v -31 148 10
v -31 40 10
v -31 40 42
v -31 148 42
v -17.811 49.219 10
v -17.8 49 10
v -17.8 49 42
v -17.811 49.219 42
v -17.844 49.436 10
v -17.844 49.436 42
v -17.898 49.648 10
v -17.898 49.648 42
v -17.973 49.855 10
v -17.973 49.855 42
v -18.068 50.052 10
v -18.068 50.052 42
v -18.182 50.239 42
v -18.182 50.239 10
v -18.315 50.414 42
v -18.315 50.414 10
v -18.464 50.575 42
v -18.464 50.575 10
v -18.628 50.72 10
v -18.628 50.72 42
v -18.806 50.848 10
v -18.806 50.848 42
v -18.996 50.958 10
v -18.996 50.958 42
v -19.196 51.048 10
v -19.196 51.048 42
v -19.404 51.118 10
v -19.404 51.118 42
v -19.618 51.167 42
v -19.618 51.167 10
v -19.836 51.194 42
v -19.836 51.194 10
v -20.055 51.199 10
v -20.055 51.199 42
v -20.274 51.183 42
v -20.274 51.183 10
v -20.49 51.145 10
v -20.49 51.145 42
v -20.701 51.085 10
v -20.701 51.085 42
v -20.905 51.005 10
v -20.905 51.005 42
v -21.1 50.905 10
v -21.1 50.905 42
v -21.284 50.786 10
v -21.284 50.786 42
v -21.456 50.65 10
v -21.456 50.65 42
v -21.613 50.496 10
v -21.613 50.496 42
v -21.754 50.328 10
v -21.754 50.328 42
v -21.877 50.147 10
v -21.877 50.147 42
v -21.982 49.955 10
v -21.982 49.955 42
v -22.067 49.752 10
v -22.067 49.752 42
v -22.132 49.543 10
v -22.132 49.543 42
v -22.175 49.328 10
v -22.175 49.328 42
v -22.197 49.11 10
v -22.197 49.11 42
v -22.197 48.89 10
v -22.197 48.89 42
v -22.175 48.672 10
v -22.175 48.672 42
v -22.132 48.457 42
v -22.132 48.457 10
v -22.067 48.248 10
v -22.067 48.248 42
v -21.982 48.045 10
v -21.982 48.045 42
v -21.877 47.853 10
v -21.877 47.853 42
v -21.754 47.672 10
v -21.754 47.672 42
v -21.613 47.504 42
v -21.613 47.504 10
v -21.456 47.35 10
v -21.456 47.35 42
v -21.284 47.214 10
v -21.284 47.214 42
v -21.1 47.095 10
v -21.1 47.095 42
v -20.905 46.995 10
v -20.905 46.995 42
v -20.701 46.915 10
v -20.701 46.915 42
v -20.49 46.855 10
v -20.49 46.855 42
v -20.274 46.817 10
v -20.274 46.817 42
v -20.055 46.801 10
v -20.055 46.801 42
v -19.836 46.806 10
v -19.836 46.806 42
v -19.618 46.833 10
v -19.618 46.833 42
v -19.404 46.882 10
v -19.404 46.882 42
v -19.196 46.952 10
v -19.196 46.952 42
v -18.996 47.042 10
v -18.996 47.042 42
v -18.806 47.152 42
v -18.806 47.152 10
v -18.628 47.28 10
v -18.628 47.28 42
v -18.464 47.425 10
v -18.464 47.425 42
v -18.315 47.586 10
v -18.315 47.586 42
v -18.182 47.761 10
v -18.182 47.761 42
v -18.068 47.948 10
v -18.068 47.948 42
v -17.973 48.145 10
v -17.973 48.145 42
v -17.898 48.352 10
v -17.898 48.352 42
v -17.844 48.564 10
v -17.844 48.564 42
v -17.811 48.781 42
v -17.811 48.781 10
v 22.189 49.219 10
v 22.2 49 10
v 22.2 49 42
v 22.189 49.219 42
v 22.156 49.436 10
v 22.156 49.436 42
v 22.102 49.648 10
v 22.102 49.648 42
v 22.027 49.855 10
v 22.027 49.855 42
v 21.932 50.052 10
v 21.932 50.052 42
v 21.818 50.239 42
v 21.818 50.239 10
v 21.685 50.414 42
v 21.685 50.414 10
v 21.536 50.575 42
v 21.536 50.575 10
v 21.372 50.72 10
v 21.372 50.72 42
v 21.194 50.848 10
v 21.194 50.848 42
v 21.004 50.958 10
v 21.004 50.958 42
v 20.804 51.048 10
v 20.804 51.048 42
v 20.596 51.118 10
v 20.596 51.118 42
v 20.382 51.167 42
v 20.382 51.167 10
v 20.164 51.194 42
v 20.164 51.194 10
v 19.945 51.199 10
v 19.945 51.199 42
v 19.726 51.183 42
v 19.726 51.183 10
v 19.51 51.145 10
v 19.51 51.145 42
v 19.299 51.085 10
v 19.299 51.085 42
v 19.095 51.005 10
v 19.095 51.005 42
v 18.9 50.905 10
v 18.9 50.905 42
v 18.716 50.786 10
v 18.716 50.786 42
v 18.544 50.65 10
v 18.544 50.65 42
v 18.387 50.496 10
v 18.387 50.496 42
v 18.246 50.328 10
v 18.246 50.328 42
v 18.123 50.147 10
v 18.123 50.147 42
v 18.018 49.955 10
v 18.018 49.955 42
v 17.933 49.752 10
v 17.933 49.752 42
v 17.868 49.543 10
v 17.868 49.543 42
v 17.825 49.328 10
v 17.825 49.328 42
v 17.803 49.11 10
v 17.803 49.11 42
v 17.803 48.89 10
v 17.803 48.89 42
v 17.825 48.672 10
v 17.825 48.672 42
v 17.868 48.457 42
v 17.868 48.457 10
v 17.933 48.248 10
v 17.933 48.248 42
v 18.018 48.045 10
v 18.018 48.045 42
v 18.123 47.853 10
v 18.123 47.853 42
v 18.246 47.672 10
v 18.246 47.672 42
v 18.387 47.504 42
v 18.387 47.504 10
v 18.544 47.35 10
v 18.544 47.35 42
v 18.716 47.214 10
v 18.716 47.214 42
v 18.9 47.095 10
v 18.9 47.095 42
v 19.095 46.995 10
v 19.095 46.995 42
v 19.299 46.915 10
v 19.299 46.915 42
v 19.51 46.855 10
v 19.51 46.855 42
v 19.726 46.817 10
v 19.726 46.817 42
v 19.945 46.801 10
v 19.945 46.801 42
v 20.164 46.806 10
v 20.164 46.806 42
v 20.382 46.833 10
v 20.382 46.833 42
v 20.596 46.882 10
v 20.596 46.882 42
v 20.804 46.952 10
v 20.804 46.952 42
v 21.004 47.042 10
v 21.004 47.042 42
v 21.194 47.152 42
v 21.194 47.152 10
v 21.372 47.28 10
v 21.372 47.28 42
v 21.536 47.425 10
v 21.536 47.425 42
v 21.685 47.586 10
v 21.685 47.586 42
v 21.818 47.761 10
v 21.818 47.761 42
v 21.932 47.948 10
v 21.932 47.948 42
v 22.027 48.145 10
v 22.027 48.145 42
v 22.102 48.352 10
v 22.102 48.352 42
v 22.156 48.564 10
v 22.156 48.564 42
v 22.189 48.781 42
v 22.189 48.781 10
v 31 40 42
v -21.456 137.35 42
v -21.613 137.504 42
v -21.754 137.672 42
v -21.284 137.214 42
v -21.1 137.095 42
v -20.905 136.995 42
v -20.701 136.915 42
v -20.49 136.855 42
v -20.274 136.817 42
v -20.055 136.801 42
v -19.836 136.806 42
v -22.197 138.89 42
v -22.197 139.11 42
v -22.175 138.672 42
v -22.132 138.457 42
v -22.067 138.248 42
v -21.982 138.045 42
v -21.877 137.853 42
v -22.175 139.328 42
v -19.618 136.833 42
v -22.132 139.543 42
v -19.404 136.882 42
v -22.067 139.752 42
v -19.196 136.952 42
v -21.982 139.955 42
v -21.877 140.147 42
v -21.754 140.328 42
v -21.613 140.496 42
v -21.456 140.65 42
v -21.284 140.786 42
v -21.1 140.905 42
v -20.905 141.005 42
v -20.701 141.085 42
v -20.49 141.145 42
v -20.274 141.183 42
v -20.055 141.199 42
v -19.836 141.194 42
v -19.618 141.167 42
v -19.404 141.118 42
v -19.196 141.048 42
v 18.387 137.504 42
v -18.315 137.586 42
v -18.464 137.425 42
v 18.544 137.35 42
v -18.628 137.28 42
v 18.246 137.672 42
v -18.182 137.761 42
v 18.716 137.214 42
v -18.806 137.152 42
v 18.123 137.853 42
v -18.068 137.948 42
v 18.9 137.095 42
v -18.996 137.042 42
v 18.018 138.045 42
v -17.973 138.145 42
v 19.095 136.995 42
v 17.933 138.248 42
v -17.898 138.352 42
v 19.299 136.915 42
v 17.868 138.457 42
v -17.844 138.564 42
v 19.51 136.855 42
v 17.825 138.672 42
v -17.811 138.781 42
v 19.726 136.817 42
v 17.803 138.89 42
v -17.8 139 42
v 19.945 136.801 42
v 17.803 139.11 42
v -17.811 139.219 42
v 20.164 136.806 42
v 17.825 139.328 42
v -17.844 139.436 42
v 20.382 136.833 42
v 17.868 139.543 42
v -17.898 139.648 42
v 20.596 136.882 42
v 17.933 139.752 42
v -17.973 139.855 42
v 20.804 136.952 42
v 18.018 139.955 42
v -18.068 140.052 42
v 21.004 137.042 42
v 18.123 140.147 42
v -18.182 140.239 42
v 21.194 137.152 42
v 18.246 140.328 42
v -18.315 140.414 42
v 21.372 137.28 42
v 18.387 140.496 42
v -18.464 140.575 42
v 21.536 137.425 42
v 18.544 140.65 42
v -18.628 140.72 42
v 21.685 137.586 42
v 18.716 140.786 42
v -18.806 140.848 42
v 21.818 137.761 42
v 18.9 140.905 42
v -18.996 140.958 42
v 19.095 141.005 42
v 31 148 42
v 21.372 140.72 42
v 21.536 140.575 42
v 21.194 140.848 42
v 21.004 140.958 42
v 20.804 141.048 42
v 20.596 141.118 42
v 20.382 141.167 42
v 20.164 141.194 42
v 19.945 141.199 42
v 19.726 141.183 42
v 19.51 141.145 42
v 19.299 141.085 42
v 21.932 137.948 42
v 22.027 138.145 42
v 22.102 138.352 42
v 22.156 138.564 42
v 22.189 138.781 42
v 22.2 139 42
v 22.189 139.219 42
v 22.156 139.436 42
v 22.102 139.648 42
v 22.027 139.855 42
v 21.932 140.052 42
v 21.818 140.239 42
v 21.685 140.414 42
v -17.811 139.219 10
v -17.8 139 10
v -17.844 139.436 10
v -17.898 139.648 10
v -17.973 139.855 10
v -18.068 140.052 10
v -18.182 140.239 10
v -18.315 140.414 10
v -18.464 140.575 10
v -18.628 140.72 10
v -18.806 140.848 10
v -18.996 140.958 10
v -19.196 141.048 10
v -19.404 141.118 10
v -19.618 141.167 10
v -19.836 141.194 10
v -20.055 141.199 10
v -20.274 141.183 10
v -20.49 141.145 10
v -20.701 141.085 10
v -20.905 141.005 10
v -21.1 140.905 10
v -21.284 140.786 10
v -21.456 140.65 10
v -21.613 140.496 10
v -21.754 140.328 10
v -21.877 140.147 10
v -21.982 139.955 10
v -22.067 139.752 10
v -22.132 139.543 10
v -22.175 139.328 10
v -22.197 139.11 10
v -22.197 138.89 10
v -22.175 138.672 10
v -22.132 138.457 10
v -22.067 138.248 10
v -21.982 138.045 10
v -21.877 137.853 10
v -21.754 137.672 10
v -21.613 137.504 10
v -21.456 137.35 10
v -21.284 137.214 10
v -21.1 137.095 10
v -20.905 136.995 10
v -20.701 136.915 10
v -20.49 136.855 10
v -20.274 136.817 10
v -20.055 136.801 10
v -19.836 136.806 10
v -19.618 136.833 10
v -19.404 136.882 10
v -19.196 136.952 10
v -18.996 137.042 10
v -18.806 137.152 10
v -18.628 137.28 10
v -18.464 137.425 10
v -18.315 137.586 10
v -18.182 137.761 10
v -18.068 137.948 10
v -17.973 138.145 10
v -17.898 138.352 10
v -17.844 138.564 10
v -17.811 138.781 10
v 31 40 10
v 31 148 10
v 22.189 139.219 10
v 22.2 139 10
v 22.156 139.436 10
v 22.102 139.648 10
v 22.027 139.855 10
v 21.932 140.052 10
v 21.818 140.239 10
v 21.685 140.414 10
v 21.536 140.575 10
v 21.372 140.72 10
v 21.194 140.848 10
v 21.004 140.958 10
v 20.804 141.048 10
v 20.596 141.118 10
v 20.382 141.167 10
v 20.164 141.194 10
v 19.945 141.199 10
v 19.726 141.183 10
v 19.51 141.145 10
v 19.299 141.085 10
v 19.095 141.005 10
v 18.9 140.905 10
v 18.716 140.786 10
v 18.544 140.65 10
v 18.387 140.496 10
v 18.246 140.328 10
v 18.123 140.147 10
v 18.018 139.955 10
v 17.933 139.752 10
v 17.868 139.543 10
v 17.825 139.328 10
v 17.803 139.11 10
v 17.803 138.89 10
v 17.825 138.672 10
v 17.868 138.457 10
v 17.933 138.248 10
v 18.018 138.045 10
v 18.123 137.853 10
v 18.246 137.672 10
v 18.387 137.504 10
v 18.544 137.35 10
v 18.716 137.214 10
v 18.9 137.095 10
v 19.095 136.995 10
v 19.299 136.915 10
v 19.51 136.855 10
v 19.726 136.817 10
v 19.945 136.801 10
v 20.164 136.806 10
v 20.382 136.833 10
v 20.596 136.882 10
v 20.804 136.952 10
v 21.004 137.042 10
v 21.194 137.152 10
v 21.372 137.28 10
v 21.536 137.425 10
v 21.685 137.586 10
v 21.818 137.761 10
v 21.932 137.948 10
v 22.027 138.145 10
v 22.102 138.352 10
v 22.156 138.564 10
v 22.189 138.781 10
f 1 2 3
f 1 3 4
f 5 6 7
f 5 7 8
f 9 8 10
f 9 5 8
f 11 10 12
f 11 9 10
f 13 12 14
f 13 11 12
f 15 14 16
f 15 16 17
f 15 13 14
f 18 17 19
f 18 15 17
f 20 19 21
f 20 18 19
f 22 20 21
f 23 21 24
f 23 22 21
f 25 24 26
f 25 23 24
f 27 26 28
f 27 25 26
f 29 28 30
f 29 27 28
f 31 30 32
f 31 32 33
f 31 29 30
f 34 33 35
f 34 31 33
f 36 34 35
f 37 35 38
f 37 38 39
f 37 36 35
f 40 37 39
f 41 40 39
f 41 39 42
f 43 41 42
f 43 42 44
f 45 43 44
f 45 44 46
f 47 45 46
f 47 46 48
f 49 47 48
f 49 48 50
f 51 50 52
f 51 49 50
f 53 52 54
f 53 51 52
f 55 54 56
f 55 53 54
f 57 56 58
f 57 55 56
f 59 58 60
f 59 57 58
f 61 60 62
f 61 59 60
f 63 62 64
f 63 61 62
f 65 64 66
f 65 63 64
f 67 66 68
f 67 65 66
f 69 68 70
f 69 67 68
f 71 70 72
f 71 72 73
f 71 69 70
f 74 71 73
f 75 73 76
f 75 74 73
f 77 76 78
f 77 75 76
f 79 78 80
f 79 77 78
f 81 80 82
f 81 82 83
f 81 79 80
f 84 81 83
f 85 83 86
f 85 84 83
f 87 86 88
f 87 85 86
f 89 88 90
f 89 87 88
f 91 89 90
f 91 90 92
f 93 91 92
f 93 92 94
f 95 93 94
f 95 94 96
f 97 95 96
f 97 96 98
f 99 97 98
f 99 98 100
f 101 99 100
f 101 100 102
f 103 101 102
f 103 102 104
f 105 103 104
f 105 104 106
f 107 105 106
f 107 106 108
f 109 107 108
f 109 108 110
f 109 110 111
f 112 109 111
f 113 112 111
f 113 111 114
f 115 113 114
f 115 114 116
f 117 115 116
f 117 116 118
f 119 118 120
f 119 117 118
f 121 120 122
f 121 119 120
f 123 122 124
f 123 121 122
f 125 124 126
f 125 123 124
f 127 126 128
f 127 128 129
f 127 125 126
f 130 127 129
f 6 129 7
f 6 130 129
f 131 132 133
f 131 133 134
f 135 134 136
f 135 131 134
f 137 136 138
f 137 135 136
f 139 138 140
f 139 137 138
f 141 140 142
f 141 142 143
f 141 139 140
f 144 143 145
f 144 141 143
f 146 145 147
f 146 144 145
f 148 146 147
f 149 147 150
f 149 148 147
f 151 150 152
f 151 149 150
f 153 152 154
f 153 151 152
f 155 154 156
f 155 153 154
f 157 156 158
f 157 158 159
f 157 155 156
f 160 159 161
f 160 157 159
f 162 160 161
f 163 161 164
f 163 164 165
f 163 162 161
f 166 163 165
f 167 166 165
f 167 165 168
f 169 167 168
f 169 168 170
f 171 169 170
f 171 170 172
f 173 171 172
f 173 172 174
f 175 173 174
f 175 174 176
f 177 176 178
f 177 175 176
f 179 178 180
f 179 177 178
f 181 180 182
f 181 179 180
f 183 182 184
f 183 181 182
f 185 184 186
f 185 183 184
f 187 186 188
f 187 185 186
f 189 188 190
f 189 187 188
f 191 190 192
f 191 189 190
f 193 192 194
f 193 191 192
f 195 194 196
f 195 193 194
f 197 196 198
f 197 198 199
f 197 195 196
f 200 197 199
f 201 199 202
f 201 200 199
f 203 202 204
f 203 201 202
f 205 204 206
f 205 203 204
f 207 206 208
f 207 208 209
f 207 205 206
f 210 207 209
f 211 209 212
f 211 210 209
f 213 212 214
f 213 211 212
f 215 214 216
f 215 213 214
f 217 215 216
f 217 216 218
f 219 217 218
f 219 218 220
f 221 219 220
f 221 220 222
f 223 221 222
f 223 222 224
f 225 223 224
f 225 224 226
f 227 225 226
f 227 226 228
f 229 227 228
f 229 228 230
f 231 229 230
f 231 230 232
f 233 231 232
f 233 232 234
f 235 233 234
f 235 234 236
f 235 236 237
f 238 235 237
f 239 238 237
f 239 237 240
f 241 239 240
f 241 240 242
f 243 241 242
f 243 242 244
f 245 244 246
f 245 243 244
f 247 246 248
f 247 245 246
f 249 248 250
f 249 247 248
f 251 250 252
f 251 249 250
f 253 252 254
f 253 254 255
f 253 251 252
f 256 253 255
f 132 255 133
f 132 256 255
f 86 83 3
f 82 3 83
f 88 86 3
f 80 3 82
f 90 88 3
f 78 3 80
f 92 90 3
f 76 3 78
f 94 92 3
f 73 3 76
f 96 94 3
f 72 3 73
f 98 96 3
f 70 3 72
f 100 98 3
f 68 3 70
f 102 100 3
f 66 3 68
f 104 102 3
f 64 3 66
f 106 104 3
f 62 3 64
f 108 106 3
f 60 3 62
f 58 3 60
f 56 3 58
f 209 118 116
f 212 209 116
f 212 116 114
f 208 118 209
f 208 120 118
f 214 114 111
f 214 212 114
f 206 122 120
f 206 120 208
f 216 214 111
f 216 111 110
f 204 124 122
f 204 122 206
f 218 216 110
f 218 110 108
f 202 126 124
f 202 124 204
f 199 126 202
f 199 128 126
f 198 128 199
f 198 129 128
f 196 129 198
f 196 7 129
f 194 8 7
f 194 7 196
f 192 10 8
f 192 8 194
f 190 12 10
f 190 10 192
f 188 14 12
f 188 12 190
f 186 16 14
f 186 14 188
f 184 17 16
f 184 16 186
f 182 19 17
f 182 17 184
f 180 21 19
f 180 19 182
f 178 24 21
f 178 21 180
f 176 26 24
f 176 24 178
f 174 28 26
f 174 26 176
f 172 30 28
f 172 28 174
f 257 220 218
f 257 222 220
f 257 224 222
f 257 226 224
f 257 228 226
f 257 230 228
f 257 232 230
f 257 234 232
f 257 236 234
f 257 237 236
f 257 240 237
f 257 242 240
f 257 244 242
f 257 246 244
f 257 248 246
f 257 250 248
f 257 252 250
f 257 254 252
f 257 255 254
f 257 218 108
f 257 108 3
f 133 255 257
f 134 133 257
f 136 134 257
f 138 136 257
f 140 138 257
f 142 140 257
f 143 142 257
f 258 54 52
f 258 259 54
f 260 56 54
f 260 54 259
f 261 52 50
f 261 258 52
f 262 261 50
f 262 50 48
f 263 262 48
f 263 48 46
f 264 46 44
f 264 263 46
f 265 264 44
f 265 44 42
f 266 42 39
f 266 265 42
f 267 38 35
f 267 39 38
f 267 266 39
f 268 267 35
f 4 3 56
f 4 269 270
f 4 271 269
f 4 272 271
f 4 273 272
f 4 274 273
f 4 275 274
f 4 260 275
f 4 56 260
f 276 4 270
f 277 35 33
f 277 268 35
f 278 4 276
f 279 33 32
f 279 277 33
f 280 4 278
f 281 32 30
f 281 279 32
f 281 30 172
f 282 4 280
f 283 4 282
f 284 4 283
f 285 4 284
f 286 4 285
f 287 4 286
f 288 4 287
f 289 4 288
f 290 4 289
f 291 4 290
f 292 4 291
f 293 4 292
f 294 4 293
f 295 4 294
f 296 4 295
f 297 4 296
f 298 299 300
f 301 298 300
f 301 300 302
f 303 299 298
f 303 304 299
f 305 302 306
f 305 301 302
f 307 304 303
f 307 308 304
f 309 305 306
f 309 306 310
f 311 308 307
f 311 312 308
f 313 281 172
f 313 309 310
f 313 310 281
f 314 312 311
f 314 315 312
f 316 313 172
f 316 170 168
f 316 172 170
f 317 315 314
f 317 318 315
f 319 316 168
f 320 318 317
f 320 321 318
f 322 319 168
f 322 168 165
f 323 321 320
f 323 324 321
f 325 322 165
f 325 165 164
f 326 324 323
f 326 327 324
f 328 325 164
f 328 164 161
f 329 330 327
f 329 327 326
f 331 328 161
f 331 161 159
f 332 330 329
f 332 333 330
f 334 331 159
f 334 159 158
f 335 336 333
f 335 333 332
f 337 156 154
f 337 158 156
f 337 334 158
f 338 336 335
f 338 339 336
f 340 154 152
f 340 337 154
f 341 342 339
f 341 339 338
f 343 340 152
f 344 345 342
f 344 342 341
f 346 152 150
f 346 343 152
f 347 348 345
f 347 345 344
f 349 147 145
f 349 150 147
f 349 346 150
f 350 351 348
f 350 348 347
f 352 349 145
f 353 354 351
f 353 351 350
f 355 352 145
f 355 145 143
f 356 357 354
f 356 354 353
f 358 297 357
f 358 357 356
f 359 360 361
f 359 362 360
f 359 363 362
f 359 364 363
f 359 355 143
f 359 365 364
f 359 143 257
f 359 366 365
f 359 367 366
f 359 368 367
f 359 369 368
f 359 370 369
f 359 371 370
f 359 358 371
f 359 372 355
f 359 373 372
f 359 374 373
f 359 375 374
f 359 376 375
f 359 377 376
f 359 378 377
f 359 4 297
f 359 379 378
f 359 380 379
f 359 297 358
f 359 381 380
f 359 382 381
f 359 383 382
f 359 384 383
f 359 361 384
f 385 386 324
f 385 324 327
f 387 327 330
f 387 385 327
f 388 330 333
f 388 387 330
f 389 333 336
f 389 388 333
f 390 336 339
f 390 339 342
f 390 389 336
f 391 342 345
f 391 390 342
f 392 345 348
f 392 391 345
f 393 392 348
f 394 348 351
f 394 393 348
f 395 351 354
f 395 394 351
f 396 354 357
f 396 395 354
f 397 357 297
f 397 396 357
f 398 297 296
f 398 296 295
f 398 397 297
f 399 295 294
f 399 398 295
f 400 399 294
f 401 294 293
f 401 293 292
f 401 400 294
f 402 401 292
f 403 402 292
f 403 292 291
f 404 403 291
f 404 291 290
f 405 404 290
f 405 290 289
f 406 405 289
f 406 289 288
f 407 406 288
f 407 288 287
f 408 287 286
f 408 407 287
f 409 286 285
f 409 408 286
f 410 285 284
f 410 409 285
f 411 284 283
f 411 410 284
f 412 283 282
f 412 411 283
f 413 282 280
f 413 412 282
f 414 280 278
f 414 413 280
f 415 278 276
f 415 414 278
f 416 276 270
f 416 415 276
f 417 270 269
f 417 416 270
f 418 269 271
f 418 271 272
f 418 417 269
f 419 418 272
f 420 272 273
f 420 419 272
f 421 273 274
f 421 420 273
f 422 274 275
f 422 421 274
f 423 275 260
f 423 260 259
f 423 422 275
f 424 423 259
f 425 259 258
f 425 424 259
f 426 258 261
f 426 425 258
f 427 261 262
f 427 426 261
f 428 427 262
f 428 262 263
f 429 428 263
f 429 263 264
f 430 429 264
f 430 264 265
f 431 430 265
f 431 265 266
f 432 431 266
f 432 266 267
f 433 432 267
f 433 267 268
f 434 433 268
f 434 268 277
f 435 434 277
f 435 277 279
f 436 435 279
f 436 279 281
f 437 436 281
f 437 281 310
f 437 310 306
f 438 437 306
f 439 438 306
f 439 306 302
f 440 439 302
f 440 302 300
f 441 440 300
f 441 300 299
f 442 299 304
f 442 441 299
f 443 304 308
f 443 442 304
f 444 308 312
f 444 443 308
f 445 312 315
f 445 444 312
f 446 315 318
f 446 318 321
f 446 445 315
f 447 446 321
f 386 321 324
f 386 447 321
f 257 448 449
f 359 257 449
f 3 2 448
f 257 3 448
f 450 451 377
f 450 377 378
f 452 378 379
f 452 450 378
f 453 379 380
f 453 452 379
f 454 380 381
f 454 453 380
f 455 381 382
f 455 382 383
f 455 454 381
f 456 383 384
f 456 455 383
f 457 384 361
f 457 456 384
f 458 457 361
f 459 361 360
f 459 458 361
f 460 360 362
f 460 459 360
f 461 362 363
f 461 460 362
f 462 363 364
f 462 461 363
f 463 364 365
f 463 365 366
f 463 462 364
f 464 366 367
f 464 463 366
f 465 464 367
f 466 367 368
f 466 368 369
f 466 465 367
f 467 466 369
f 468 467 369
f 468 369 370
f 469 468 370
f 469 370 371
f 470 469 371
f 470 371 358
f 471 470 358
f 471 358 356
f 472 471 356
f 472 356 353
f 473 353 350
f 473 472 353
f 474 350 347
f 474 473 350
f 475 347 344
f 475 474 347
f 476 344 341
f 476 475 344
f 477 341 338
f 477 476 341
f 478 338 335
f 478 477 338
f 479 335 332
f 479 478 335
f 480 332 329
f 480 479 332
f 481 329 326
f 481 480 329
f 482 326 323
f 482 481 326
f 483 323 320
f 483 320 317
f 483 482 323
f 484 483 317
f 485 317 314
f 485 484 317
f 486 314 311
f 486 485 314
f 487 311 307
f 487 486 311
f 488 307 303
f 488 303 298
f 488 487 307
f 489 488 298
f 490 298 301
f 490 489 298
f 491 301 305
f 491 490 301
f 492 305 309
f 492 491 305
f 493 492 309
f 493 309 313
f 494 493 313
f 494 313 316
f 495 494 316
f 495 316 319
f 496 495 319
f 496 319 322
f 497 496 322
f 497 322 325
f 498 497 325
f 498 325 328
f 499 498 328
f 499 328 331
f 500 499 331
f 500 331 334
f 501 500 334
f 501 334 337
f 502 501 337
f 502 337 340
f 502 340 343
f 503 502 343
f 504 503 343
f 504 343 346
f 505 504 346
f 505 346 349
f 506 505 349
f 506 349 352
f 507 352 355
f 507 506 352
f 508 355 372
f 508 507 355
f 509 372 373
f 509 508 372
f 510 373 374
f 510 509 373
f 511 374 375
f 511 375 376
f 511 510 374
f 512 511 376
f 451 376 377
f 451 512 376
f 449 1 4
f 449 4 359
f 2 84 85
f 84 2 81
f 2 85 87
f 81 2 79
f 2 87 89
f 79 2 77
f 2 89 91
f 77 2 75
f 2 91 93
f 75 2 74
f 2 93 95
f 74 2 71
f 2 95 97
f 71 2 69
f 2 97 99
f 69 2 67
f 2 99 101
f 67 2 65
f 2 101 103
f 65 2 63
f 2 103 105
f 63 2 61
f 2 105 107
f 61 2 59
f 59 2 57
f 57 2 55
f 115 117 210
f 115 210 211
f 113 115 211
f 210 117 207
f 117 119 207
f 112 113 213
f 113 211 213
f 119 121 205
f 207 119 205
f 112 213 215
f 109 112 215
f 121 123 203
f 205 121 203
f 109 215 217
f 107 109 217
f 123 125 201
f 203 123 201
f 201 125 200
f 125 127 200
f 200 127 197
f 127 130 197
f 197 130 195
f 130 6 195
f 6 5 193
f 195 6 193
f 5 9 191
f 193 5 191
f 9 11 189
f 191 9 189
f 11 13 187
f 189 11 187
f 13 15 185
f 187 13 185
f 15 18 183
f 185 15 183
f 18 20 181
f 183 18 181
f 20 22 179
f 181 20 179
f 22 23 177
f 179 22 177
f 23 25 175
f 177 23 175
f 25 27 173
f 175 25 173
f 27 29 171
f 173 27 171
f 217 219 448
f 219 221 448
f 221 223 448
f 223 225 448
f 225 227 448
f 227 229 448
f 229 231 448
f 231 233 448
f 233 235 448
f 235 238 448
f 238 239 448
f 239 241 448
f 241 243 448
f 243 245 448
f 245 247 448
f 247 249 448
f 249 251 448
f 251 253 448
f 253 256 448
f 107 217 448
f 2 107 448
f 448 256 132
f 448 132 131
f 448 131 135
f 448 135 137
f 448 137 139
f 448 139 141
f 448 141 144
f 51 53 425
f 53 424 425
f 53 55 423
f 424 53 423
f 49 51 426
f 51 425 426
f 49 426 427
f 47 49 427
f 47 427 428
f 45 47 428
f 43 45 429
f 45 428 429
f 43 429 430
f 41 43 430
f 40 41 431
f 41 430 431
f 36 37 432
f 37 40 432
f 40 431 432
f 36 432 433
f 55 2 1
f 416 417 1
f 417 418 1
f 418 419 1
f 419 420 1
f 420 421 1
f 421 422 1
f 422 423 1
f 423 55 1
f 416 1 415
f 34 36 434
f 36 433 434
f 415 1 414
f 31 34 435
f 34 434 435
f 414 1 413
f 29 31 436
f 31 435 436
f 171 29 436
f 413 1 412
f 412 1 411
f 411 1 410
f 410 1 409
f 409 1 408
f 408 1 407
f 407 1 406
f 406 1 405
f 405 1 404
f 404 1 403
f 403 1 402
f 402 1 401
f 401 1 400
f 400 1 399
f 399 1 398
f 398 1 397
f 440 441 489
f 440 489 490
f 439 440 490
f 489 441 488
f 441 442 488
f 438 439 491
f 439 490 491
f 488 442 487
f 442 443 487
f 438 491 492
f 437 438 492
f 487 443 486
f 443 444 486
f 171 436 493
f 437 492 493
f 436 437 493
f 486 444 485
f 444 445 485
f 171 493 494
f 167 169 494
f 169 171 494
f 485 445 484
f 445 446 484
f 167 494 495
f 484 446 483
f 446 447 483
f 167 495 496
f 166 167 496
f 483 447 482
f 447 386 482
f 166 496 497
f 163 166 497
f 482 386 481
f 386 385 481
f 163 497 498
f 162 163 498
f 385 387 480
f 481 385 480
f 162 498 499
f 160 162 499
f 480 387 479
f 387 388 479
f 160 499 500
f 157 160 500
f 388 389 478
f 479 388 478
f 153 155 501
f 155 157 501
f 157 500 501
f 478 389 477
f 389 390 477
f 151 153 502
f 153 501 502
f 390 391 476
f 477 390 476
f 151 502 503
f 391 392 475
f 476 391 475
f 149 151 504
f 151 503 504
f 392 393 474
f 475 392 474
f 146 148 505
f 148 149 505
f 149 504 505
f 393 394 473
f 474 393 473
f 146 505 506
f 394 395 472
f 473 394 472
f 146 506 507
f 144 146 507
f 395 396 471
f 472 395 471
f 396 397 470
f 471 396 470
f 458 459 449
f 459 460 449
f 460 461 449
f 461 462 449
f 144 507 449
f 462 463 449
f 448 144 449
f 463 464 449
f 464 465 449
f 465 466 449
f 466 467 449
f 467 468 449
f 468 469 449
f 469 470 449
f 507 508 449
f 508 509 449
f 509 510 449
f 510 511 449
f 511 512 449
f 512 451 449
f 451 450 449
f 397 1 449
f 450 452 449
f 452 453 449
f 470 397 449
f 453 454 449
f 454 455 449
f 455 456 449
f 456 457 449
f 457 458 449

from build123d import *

# Parameters (mm, degrees)
CYLINDER005_R     = 2.2
CYLINDER005_DEPTH = 32
ARRAY004_X_COUNT  = 2
ARRAY004_X_PITCH  = 40
ARRAY004_Y_COUNT  = 2
ARRAY004_Y_PITCH  = 90
BOX005_W          = 62
BOX005_H          = 108
BOX005_DEPTH      = 32


with BuildPart() as psu_mockup_hole_array:
    # Cylinder005 → Cylinder005 (new body)
    with BuildSketch(Plane.XY):
        Circle(CYLINDER005_R)
    extrude(amount=CYLINDER005_DEPTH)

    # Array004 X: psu mockup hole array ×2


with BuildPart() as psu_mockup_hole_array_1:
    add(psu_mockup_hole_array.part)
    with Locations(*[(i * ARRAY004_X_PITCH, 0, 0) for i in range(1, ARRAY004_X_COUNT)]):
        add(psu_mockup_hole_array.part)

    # Array004 Y: psu mockup hole array ×2


with BuildPart() as psu_mockup_hole_array_2:
    add(psu_mockup_hole_array_1.part)
    with Locations(*[(0, i * ARRAY004_Y_PITCH, 0) for i in range(1, ARRAY004_Y_COUNT)]):
        add(psu_mockup_hole_array_1.part)


with BuildPart() as psu_mockup_hole_array_3:
    # Array004 placement: moved
    add(psu_mockup_hole_array_2.part.moved(Location((11, 9, 0))))


with BuildPart() as psu_mockup_with_holes:
    # Box005 → Box005 (new body)
    with BuildSketch(Plane.XY):
        with Locations((31, 54)):
            Rectangle(BOX005_W, BOX005_H)
    extrude(amount=BOX005_DEPTH)

    # Cut003: cut psu mockup hole array
    add(psu_mockup_hole_array_3.part, mode=Mode.SUBTRACT)


with BuildPart() as psu_mockup_with_holes_1:
    # Cut003 placement: moved
    add(psu_mockup_with_holes.part.moved(Location((-31, 40, 10))))


solid = psu_mockup_with_holes_1.part
